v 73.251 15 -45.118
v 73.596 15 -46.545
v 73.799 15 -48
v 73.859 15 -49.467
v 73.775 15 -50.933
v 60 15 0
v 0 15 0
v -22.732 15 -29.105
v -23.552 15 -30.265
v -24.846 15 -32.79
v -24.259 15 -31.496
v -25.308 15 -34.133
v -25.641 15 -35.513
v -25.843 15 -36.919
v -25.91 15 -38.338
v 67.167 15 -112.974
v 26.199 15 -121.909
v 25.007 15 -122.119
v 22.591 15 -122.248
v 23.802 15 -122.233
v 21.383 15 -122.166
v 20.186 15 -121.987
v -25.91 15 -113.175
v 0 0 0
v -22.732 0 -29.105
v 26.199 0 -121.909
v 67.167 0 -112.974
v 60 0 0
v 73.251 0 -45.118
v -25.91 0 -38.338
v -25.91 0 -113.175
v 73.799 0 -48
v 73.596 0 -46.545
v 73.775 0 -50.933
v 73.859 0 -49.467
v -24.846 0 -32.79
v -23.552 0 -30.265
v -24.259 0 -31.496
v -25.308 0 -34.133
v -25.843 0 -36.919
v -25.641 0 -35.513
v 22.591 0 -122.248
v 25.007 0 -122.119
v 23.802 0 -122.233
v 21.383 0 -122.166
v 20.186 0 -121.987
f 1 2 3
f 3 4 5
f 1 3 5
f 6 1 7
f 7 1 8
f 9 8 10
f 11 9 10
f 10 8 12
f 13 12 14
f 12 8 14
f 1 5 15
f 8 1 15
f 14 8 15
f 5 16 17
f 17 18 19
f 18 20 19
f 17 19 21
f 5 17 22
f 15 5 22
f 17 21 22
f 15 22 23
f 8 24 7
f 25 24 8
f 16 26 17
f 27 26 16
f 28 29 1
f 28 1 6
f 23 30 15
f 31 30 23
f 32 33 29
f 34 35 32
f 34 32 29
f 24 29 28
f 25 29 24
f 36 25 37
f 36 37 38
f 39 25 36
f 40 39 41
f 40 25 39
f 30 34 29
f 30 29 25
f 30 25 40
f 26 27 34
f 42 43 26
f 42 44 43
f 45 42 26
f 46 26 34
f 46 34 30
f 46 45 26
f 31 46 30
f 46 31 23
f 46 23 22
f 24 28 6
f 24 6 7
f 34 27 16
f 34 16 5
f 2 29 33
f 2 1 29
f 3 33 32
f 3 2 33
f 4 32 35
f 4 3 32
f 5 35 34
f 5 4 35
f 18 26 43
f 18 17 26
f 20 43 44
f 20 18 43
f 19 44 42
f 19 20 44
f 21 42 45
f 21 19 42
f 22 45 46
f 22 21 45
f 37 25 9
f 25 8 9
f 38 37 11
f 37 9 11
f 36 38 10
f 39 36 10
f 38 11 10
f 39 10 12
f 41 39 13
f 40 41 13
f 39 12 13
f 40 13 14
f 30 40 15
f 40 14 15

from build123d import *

# Parameters (mm, degrees)
EXTRUDE_1_DEPTH = 15
FILLET_1_R      = 15
FILLET_2_R      = 15
FILLET_3_R      = 15


with BuildPart() as part:
    # Эскиз1 → Бобышка-Вытянуть1 (new body)
    with BuildSketch(Plane(origin=(0, 0, 0), x_dir=(1, 0, 0), z_dir=(0, 1, 0))):
        Polygon((0, 0), (-25.909847732, 33.174508492), (-25.909847732, 113.174508492), (23.200748024, 122.563298857), (67.167075345, 112.973613675), (74.090152268, 47.973613675), (60, 0), align=None)
    extrude(amount=EXTRUDE_1_DEPTH)

    # Скругление1
    fillet_1_edges = [part.edges().sort_by_distance(p)[0] for p in [
        (-25.909847732, 7.5, -33.174508492),
    ]]
    fillet(fillet_1_edges, radius=FILLET_1_R)

    # Скругление2
    fillet_2_edges = [part.edges().sort_by_distance(p)[0] for p in [
        (74.090152268, 7.5, -47.973613675),
    ]]
    fillet(fillet_2_edges, radius=FILLET_2_R)

    # Скругление3
    fillet_3_edges = [part.edges().sort_by_distance(p)[0] for p in [
        (23.200748024, 7.5, -122.563298857),
    ]]
    fillet(fillet_3_edges, radius=FILLET_3_R)


solid = part.part
